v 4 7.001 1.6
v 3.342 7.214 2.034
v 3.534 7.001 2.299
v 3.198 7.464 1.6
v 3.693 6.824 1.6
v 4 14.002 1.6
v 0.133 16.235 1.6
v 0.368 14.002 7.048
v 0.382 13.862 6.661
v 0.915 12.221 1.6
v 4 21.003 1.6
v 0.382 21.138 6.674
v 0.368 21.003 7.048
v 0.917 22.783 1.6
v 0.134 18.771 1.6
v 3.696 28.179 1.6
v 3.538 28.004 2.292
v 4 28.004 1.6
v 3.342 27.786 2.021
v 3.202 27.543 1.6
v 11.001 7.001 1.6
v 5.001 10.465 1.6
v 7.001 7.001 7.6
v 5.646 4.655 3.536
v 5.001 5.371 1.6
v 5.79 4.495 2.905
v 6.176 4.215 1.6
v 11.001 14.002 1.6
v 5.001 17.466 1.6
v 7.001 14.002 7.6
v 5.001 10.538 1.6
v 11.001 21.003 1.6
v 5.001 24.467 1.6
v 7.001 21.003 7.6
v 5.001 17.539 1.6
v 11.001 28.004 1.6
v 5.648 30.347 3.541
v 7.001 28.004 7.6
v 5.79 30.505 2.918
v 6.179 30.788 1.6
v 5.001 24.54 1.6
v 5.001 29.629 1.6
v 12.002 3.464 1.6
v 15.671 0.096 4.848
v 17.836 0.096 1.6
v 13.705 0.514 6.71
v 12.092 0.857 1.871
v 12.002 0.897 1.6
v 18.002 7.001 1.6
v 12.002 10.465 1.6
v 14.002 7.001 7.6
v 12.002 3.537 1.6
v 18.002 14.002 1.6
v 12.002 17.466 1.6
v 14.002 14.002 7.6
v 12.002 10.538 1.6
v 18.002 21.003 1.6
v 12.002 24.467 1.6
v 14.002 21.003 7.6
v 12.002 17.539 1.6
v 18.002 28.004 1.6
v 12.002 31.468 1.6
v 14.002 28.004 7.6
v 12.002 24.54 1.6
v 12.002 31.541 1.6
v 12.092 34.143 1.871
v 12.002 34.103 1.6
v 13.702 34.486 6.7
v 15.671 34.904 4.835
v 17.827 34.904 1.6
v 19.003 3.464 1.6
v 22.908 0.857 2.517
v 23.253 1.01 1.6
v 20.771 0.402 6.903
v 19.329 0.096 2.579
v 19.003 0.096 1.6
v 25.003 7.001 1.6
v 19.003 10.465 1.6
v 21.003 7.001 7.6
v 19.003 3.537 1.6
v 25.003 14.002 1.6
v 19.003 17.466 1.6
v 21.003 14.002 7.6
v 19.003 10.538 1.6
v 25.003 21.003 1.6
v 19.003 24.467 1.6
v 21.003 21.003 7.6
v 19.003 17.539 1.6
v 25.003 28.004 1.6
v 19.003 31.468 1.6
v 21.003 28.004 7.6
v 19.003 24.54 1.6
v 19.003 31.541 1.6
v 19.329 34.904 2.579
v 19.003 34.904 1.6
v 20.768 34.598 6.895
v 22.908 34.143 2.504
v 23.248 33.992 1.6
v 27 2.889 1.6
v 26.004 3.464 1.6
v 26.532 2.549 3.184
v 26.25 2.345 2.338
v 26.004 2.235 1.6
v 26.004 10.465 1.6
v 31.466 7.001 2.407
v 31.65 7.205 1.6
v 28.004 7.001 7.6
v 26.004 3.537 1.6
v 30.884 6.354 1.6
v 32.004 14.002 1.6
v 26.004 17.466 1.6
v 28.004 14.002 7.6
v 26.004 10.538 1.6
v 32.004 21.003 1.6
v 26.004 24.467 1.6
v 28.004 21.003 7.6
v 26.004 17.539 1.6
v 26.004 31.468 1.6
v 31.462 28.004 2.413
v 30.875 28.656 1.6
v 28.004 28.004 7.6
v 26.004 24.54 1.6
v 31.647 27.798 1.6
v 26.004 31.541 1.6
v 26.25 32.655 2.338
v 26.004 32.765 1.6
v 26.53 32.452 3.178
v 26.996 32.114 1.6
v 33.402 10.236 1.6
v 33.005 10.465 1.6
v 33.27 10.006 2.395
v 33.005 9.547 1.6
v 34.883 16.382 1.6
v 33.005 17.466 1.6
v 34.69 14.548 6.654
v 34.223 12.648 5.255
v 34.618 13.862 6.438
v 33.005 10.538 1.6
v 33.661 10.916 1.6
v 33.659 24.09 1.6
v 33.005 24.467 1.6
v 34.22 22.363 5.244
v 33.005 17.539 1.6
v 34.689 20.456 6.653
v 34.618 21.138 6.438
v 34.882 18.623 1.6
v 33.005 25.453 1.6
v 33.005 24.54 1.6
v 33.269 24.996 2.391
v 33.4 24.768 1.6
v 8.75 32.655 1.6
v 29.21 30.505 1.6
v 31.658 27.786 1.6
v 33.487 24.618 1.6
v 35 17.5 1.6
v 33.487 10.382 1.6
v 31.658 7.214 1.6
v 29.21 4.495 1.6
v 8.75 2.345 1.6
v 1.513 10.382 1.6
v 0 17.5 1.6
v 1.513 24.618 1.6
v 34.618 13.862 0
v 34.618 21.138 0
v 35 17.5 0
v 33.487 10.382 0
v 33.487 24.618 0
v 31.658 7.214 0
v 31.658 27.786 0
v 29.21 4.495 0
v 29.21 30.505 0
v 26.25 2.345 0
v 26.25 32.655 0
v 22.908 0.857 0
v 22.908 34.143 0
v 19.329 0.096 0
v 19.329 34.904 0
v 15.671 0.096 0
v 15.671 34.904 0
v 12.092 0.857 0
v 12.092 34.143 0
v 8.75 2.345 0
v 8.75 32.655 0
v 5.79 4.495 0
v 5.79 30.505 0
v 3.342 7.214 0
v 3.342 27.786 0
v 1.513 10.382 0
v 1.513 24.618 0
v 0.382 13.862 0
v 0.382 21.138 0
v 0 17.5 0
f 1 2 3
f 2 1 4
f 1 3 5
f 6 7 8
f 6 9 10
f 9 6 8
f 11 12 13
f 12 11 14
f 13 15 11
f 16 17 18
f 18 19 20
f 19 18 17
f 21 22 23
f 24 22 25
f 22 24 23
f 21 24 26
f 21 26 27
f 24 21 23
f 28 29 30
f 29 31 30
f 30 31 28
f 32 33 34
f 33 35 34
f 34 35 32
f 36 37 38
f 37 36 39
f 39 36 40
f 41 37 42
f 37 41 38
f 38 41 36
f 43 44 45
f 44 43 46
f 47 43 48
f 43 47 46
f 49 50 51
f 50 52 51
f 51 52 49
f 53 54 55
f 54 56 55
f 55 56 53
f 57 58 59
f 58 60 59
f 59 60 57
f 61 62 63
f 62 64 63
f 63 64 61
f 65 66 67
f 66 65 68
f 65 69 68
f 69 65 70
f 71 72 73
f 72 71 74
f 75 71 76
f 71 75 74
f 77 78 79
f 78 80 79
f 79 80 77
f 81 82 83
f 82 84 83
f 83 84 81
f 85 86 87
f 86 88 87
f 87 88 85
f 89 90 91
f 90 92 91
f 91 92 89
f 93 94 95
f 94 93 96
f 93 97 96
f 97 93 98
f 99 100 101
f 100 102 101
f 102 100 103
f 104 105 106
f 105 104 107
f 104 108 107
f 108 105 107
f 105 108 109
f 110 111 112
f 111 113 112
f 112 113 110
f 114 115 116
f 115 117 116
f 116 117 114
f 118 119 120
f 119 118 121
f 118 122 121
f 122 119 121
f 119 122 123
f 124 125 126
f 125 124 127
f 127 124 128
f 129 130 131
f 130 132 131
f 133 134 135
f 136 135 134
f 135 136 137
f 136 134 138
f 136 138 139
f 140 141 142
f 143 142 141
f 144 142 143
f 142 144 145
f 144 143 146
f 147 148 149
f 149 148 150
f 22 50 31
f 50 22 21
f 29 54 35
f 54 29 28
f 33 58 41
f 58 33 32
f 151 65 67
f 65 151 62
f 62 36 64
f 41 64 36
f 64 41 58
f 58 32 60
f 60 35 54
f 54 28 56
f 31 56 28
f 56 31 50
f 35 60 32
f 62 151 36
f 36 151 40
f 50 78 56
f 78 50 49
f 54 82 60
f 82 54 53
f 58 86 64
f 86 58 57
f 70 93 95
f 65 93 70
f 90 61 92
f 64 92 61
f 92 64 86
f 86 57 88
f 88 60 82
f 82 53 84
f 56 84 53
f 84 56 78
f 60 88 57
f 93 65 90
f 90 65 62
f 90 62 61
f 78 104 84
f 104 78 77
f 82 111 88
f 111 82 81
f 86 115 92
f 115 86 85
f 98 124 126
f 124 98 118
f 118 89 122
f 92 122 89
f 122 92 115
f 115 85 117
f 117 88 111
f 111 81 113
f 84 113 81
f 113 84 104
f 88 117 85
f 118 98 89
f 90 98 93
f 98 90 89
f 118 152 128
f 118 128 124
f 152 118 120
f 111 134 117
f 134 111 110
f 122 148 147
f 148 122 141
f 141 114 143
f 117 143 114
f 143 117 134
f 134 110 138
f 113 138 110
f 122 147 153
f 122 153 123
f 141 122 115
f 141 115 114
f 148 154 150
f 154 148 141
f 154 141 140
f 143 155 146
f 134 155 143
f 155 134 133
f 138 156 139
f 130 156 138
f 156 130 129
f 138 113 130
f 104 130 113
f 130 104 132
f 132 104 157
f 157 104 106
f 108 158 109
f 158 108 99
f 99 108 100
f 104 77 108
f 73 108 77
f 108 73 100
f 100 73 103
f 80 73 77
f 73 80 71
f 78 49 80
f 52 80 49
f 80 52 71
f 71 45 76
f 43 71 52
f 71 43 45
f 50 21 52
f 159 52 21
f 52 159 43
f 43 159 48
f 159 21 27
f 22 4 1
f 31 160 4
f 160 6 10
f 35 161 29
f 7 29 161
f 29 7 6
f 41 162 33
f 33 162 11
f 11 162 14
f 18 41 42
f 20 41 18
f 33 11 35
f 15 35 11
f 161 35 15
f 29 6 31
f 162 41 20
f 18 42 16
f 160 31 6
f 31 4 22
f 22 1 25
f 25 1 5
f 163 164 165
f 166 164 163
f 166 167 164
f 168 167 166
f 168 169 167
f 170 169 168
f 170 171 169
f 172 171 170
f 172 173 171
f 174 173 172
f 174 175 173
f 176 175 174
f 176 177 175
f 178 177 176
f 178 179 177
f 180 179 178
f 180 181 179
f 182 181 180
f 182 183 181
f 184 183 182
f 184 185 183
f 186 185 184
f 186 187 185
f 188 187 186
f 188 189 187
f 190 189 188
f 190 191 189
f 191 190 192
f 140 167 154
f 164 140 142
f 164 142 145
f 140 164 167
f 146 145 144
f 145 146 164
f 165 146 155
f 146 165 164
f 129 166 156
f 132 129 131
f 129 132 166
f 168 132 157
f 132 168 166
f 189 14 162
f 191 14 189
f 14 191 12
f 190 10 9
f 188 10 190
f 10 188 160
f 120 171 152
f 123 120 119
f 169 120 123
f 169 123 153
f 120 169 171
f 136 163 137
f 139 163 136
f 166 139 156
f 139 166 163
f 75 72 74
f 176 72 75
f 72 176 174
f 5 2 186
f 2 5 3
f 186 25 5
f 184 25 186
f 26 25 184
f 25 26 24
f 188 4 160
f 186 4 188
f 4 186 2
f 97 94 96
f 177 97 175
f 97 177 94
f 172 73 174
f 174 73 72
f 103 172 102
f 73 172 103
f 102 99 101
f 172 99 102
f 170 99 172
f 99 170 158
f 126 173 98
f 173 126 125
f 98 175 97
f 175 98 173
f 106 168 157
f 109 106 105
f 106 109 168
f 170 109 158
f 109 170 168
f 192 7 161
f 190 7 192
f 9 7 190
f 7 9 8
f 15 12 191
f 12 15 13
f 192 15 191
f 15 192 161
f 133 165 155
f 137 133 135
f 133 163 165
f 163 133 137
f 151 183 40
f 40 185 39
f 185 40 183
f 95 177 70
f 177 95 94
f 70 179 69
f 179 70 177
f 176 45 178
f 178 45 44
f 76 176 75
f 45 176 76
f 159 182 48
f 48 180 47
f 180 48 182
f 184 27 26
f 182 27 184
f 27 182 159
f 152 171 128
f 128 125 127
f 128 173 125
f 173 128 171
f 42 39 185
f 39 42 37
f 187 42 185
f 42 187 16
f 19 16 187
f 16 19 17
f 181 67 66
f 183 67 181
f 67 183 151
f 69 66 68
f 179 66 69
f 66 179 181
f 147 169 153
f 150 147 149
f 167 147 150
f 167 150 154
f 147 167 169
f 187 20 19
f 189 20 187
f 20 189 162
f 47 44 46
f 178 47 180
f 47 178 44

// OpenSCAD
/* [Title Spike STL Creator] */
// size in the x direction in mm icon:arrow-left-right
size_x = 35; // .1
// size in the y direction in mm icon:arrow-up-down
size_y = 35; // .1
// Space between the spikes, lower = less space between spikes icon:dots-grid
density = 7.001; // [0:0.001:30] 
// factor, just try until it fits icon:triangle
pointyness = 6; // [30]
// use a high value for cones
spike_sides = 3; // [50]
// baseplate height in mm
baseplate_height = 1.6; // .1
// base of the spikes in mm
spike_base_xy = 4; // .1

// enable random sized spikes
random = false;
// radius around 1, result is factor
random_factor_r = .3; // .01
/* [Hidden] */
// makes halfed spikes start at the edges, best explained by trying
weird_edges = true; 

// true = square, false = circle, circles assume size_y = size_x, because who need ellipses?
shape = false; // [true:square, false:circle]


// seed for the random setting
seed = 42;
prng = rands(1 - random_factor_r,1 + random_factor_r,((size_x + 1) * (size_y + 1)) / density,seed);

module spike(i) {
	rand = random ? prng[i] : 1;
	scale([1 * rand, 1 * rand, 1 * rand])
	cylinder(1,spike_base_xy,00,$fn=spike_sides);
}

intersection () {
	total_max_height = (pointyness + baseplate_height) * (1+(random?random_factor_r:0));
	if (shape) {
		cube([size_x, size_y, total_max_height]);
	} else {
		translate([size_x/2, size_x/2,0])
			linear_extrude(total_max_height)
			circle(d=size_x);
	}
	union () {
		offset = weird_edges? 1 : 0;
		xmax = size_x + (weird_edges?density:0);
		ymax = size_y + (weird_edges?density:0);
		cube([size_x,size_y, baseplate_height]);

		for (x = [1:density:xmax])
			for (y = [1:density:ymax]) {
				translate([x - offset, y - offset, baseplate_height - 0.0001])
					scale([1, 1, pointyness])
					spike(floor(x / density) * floor(xmax / density) + floor(y / density));
			}
	}
}
